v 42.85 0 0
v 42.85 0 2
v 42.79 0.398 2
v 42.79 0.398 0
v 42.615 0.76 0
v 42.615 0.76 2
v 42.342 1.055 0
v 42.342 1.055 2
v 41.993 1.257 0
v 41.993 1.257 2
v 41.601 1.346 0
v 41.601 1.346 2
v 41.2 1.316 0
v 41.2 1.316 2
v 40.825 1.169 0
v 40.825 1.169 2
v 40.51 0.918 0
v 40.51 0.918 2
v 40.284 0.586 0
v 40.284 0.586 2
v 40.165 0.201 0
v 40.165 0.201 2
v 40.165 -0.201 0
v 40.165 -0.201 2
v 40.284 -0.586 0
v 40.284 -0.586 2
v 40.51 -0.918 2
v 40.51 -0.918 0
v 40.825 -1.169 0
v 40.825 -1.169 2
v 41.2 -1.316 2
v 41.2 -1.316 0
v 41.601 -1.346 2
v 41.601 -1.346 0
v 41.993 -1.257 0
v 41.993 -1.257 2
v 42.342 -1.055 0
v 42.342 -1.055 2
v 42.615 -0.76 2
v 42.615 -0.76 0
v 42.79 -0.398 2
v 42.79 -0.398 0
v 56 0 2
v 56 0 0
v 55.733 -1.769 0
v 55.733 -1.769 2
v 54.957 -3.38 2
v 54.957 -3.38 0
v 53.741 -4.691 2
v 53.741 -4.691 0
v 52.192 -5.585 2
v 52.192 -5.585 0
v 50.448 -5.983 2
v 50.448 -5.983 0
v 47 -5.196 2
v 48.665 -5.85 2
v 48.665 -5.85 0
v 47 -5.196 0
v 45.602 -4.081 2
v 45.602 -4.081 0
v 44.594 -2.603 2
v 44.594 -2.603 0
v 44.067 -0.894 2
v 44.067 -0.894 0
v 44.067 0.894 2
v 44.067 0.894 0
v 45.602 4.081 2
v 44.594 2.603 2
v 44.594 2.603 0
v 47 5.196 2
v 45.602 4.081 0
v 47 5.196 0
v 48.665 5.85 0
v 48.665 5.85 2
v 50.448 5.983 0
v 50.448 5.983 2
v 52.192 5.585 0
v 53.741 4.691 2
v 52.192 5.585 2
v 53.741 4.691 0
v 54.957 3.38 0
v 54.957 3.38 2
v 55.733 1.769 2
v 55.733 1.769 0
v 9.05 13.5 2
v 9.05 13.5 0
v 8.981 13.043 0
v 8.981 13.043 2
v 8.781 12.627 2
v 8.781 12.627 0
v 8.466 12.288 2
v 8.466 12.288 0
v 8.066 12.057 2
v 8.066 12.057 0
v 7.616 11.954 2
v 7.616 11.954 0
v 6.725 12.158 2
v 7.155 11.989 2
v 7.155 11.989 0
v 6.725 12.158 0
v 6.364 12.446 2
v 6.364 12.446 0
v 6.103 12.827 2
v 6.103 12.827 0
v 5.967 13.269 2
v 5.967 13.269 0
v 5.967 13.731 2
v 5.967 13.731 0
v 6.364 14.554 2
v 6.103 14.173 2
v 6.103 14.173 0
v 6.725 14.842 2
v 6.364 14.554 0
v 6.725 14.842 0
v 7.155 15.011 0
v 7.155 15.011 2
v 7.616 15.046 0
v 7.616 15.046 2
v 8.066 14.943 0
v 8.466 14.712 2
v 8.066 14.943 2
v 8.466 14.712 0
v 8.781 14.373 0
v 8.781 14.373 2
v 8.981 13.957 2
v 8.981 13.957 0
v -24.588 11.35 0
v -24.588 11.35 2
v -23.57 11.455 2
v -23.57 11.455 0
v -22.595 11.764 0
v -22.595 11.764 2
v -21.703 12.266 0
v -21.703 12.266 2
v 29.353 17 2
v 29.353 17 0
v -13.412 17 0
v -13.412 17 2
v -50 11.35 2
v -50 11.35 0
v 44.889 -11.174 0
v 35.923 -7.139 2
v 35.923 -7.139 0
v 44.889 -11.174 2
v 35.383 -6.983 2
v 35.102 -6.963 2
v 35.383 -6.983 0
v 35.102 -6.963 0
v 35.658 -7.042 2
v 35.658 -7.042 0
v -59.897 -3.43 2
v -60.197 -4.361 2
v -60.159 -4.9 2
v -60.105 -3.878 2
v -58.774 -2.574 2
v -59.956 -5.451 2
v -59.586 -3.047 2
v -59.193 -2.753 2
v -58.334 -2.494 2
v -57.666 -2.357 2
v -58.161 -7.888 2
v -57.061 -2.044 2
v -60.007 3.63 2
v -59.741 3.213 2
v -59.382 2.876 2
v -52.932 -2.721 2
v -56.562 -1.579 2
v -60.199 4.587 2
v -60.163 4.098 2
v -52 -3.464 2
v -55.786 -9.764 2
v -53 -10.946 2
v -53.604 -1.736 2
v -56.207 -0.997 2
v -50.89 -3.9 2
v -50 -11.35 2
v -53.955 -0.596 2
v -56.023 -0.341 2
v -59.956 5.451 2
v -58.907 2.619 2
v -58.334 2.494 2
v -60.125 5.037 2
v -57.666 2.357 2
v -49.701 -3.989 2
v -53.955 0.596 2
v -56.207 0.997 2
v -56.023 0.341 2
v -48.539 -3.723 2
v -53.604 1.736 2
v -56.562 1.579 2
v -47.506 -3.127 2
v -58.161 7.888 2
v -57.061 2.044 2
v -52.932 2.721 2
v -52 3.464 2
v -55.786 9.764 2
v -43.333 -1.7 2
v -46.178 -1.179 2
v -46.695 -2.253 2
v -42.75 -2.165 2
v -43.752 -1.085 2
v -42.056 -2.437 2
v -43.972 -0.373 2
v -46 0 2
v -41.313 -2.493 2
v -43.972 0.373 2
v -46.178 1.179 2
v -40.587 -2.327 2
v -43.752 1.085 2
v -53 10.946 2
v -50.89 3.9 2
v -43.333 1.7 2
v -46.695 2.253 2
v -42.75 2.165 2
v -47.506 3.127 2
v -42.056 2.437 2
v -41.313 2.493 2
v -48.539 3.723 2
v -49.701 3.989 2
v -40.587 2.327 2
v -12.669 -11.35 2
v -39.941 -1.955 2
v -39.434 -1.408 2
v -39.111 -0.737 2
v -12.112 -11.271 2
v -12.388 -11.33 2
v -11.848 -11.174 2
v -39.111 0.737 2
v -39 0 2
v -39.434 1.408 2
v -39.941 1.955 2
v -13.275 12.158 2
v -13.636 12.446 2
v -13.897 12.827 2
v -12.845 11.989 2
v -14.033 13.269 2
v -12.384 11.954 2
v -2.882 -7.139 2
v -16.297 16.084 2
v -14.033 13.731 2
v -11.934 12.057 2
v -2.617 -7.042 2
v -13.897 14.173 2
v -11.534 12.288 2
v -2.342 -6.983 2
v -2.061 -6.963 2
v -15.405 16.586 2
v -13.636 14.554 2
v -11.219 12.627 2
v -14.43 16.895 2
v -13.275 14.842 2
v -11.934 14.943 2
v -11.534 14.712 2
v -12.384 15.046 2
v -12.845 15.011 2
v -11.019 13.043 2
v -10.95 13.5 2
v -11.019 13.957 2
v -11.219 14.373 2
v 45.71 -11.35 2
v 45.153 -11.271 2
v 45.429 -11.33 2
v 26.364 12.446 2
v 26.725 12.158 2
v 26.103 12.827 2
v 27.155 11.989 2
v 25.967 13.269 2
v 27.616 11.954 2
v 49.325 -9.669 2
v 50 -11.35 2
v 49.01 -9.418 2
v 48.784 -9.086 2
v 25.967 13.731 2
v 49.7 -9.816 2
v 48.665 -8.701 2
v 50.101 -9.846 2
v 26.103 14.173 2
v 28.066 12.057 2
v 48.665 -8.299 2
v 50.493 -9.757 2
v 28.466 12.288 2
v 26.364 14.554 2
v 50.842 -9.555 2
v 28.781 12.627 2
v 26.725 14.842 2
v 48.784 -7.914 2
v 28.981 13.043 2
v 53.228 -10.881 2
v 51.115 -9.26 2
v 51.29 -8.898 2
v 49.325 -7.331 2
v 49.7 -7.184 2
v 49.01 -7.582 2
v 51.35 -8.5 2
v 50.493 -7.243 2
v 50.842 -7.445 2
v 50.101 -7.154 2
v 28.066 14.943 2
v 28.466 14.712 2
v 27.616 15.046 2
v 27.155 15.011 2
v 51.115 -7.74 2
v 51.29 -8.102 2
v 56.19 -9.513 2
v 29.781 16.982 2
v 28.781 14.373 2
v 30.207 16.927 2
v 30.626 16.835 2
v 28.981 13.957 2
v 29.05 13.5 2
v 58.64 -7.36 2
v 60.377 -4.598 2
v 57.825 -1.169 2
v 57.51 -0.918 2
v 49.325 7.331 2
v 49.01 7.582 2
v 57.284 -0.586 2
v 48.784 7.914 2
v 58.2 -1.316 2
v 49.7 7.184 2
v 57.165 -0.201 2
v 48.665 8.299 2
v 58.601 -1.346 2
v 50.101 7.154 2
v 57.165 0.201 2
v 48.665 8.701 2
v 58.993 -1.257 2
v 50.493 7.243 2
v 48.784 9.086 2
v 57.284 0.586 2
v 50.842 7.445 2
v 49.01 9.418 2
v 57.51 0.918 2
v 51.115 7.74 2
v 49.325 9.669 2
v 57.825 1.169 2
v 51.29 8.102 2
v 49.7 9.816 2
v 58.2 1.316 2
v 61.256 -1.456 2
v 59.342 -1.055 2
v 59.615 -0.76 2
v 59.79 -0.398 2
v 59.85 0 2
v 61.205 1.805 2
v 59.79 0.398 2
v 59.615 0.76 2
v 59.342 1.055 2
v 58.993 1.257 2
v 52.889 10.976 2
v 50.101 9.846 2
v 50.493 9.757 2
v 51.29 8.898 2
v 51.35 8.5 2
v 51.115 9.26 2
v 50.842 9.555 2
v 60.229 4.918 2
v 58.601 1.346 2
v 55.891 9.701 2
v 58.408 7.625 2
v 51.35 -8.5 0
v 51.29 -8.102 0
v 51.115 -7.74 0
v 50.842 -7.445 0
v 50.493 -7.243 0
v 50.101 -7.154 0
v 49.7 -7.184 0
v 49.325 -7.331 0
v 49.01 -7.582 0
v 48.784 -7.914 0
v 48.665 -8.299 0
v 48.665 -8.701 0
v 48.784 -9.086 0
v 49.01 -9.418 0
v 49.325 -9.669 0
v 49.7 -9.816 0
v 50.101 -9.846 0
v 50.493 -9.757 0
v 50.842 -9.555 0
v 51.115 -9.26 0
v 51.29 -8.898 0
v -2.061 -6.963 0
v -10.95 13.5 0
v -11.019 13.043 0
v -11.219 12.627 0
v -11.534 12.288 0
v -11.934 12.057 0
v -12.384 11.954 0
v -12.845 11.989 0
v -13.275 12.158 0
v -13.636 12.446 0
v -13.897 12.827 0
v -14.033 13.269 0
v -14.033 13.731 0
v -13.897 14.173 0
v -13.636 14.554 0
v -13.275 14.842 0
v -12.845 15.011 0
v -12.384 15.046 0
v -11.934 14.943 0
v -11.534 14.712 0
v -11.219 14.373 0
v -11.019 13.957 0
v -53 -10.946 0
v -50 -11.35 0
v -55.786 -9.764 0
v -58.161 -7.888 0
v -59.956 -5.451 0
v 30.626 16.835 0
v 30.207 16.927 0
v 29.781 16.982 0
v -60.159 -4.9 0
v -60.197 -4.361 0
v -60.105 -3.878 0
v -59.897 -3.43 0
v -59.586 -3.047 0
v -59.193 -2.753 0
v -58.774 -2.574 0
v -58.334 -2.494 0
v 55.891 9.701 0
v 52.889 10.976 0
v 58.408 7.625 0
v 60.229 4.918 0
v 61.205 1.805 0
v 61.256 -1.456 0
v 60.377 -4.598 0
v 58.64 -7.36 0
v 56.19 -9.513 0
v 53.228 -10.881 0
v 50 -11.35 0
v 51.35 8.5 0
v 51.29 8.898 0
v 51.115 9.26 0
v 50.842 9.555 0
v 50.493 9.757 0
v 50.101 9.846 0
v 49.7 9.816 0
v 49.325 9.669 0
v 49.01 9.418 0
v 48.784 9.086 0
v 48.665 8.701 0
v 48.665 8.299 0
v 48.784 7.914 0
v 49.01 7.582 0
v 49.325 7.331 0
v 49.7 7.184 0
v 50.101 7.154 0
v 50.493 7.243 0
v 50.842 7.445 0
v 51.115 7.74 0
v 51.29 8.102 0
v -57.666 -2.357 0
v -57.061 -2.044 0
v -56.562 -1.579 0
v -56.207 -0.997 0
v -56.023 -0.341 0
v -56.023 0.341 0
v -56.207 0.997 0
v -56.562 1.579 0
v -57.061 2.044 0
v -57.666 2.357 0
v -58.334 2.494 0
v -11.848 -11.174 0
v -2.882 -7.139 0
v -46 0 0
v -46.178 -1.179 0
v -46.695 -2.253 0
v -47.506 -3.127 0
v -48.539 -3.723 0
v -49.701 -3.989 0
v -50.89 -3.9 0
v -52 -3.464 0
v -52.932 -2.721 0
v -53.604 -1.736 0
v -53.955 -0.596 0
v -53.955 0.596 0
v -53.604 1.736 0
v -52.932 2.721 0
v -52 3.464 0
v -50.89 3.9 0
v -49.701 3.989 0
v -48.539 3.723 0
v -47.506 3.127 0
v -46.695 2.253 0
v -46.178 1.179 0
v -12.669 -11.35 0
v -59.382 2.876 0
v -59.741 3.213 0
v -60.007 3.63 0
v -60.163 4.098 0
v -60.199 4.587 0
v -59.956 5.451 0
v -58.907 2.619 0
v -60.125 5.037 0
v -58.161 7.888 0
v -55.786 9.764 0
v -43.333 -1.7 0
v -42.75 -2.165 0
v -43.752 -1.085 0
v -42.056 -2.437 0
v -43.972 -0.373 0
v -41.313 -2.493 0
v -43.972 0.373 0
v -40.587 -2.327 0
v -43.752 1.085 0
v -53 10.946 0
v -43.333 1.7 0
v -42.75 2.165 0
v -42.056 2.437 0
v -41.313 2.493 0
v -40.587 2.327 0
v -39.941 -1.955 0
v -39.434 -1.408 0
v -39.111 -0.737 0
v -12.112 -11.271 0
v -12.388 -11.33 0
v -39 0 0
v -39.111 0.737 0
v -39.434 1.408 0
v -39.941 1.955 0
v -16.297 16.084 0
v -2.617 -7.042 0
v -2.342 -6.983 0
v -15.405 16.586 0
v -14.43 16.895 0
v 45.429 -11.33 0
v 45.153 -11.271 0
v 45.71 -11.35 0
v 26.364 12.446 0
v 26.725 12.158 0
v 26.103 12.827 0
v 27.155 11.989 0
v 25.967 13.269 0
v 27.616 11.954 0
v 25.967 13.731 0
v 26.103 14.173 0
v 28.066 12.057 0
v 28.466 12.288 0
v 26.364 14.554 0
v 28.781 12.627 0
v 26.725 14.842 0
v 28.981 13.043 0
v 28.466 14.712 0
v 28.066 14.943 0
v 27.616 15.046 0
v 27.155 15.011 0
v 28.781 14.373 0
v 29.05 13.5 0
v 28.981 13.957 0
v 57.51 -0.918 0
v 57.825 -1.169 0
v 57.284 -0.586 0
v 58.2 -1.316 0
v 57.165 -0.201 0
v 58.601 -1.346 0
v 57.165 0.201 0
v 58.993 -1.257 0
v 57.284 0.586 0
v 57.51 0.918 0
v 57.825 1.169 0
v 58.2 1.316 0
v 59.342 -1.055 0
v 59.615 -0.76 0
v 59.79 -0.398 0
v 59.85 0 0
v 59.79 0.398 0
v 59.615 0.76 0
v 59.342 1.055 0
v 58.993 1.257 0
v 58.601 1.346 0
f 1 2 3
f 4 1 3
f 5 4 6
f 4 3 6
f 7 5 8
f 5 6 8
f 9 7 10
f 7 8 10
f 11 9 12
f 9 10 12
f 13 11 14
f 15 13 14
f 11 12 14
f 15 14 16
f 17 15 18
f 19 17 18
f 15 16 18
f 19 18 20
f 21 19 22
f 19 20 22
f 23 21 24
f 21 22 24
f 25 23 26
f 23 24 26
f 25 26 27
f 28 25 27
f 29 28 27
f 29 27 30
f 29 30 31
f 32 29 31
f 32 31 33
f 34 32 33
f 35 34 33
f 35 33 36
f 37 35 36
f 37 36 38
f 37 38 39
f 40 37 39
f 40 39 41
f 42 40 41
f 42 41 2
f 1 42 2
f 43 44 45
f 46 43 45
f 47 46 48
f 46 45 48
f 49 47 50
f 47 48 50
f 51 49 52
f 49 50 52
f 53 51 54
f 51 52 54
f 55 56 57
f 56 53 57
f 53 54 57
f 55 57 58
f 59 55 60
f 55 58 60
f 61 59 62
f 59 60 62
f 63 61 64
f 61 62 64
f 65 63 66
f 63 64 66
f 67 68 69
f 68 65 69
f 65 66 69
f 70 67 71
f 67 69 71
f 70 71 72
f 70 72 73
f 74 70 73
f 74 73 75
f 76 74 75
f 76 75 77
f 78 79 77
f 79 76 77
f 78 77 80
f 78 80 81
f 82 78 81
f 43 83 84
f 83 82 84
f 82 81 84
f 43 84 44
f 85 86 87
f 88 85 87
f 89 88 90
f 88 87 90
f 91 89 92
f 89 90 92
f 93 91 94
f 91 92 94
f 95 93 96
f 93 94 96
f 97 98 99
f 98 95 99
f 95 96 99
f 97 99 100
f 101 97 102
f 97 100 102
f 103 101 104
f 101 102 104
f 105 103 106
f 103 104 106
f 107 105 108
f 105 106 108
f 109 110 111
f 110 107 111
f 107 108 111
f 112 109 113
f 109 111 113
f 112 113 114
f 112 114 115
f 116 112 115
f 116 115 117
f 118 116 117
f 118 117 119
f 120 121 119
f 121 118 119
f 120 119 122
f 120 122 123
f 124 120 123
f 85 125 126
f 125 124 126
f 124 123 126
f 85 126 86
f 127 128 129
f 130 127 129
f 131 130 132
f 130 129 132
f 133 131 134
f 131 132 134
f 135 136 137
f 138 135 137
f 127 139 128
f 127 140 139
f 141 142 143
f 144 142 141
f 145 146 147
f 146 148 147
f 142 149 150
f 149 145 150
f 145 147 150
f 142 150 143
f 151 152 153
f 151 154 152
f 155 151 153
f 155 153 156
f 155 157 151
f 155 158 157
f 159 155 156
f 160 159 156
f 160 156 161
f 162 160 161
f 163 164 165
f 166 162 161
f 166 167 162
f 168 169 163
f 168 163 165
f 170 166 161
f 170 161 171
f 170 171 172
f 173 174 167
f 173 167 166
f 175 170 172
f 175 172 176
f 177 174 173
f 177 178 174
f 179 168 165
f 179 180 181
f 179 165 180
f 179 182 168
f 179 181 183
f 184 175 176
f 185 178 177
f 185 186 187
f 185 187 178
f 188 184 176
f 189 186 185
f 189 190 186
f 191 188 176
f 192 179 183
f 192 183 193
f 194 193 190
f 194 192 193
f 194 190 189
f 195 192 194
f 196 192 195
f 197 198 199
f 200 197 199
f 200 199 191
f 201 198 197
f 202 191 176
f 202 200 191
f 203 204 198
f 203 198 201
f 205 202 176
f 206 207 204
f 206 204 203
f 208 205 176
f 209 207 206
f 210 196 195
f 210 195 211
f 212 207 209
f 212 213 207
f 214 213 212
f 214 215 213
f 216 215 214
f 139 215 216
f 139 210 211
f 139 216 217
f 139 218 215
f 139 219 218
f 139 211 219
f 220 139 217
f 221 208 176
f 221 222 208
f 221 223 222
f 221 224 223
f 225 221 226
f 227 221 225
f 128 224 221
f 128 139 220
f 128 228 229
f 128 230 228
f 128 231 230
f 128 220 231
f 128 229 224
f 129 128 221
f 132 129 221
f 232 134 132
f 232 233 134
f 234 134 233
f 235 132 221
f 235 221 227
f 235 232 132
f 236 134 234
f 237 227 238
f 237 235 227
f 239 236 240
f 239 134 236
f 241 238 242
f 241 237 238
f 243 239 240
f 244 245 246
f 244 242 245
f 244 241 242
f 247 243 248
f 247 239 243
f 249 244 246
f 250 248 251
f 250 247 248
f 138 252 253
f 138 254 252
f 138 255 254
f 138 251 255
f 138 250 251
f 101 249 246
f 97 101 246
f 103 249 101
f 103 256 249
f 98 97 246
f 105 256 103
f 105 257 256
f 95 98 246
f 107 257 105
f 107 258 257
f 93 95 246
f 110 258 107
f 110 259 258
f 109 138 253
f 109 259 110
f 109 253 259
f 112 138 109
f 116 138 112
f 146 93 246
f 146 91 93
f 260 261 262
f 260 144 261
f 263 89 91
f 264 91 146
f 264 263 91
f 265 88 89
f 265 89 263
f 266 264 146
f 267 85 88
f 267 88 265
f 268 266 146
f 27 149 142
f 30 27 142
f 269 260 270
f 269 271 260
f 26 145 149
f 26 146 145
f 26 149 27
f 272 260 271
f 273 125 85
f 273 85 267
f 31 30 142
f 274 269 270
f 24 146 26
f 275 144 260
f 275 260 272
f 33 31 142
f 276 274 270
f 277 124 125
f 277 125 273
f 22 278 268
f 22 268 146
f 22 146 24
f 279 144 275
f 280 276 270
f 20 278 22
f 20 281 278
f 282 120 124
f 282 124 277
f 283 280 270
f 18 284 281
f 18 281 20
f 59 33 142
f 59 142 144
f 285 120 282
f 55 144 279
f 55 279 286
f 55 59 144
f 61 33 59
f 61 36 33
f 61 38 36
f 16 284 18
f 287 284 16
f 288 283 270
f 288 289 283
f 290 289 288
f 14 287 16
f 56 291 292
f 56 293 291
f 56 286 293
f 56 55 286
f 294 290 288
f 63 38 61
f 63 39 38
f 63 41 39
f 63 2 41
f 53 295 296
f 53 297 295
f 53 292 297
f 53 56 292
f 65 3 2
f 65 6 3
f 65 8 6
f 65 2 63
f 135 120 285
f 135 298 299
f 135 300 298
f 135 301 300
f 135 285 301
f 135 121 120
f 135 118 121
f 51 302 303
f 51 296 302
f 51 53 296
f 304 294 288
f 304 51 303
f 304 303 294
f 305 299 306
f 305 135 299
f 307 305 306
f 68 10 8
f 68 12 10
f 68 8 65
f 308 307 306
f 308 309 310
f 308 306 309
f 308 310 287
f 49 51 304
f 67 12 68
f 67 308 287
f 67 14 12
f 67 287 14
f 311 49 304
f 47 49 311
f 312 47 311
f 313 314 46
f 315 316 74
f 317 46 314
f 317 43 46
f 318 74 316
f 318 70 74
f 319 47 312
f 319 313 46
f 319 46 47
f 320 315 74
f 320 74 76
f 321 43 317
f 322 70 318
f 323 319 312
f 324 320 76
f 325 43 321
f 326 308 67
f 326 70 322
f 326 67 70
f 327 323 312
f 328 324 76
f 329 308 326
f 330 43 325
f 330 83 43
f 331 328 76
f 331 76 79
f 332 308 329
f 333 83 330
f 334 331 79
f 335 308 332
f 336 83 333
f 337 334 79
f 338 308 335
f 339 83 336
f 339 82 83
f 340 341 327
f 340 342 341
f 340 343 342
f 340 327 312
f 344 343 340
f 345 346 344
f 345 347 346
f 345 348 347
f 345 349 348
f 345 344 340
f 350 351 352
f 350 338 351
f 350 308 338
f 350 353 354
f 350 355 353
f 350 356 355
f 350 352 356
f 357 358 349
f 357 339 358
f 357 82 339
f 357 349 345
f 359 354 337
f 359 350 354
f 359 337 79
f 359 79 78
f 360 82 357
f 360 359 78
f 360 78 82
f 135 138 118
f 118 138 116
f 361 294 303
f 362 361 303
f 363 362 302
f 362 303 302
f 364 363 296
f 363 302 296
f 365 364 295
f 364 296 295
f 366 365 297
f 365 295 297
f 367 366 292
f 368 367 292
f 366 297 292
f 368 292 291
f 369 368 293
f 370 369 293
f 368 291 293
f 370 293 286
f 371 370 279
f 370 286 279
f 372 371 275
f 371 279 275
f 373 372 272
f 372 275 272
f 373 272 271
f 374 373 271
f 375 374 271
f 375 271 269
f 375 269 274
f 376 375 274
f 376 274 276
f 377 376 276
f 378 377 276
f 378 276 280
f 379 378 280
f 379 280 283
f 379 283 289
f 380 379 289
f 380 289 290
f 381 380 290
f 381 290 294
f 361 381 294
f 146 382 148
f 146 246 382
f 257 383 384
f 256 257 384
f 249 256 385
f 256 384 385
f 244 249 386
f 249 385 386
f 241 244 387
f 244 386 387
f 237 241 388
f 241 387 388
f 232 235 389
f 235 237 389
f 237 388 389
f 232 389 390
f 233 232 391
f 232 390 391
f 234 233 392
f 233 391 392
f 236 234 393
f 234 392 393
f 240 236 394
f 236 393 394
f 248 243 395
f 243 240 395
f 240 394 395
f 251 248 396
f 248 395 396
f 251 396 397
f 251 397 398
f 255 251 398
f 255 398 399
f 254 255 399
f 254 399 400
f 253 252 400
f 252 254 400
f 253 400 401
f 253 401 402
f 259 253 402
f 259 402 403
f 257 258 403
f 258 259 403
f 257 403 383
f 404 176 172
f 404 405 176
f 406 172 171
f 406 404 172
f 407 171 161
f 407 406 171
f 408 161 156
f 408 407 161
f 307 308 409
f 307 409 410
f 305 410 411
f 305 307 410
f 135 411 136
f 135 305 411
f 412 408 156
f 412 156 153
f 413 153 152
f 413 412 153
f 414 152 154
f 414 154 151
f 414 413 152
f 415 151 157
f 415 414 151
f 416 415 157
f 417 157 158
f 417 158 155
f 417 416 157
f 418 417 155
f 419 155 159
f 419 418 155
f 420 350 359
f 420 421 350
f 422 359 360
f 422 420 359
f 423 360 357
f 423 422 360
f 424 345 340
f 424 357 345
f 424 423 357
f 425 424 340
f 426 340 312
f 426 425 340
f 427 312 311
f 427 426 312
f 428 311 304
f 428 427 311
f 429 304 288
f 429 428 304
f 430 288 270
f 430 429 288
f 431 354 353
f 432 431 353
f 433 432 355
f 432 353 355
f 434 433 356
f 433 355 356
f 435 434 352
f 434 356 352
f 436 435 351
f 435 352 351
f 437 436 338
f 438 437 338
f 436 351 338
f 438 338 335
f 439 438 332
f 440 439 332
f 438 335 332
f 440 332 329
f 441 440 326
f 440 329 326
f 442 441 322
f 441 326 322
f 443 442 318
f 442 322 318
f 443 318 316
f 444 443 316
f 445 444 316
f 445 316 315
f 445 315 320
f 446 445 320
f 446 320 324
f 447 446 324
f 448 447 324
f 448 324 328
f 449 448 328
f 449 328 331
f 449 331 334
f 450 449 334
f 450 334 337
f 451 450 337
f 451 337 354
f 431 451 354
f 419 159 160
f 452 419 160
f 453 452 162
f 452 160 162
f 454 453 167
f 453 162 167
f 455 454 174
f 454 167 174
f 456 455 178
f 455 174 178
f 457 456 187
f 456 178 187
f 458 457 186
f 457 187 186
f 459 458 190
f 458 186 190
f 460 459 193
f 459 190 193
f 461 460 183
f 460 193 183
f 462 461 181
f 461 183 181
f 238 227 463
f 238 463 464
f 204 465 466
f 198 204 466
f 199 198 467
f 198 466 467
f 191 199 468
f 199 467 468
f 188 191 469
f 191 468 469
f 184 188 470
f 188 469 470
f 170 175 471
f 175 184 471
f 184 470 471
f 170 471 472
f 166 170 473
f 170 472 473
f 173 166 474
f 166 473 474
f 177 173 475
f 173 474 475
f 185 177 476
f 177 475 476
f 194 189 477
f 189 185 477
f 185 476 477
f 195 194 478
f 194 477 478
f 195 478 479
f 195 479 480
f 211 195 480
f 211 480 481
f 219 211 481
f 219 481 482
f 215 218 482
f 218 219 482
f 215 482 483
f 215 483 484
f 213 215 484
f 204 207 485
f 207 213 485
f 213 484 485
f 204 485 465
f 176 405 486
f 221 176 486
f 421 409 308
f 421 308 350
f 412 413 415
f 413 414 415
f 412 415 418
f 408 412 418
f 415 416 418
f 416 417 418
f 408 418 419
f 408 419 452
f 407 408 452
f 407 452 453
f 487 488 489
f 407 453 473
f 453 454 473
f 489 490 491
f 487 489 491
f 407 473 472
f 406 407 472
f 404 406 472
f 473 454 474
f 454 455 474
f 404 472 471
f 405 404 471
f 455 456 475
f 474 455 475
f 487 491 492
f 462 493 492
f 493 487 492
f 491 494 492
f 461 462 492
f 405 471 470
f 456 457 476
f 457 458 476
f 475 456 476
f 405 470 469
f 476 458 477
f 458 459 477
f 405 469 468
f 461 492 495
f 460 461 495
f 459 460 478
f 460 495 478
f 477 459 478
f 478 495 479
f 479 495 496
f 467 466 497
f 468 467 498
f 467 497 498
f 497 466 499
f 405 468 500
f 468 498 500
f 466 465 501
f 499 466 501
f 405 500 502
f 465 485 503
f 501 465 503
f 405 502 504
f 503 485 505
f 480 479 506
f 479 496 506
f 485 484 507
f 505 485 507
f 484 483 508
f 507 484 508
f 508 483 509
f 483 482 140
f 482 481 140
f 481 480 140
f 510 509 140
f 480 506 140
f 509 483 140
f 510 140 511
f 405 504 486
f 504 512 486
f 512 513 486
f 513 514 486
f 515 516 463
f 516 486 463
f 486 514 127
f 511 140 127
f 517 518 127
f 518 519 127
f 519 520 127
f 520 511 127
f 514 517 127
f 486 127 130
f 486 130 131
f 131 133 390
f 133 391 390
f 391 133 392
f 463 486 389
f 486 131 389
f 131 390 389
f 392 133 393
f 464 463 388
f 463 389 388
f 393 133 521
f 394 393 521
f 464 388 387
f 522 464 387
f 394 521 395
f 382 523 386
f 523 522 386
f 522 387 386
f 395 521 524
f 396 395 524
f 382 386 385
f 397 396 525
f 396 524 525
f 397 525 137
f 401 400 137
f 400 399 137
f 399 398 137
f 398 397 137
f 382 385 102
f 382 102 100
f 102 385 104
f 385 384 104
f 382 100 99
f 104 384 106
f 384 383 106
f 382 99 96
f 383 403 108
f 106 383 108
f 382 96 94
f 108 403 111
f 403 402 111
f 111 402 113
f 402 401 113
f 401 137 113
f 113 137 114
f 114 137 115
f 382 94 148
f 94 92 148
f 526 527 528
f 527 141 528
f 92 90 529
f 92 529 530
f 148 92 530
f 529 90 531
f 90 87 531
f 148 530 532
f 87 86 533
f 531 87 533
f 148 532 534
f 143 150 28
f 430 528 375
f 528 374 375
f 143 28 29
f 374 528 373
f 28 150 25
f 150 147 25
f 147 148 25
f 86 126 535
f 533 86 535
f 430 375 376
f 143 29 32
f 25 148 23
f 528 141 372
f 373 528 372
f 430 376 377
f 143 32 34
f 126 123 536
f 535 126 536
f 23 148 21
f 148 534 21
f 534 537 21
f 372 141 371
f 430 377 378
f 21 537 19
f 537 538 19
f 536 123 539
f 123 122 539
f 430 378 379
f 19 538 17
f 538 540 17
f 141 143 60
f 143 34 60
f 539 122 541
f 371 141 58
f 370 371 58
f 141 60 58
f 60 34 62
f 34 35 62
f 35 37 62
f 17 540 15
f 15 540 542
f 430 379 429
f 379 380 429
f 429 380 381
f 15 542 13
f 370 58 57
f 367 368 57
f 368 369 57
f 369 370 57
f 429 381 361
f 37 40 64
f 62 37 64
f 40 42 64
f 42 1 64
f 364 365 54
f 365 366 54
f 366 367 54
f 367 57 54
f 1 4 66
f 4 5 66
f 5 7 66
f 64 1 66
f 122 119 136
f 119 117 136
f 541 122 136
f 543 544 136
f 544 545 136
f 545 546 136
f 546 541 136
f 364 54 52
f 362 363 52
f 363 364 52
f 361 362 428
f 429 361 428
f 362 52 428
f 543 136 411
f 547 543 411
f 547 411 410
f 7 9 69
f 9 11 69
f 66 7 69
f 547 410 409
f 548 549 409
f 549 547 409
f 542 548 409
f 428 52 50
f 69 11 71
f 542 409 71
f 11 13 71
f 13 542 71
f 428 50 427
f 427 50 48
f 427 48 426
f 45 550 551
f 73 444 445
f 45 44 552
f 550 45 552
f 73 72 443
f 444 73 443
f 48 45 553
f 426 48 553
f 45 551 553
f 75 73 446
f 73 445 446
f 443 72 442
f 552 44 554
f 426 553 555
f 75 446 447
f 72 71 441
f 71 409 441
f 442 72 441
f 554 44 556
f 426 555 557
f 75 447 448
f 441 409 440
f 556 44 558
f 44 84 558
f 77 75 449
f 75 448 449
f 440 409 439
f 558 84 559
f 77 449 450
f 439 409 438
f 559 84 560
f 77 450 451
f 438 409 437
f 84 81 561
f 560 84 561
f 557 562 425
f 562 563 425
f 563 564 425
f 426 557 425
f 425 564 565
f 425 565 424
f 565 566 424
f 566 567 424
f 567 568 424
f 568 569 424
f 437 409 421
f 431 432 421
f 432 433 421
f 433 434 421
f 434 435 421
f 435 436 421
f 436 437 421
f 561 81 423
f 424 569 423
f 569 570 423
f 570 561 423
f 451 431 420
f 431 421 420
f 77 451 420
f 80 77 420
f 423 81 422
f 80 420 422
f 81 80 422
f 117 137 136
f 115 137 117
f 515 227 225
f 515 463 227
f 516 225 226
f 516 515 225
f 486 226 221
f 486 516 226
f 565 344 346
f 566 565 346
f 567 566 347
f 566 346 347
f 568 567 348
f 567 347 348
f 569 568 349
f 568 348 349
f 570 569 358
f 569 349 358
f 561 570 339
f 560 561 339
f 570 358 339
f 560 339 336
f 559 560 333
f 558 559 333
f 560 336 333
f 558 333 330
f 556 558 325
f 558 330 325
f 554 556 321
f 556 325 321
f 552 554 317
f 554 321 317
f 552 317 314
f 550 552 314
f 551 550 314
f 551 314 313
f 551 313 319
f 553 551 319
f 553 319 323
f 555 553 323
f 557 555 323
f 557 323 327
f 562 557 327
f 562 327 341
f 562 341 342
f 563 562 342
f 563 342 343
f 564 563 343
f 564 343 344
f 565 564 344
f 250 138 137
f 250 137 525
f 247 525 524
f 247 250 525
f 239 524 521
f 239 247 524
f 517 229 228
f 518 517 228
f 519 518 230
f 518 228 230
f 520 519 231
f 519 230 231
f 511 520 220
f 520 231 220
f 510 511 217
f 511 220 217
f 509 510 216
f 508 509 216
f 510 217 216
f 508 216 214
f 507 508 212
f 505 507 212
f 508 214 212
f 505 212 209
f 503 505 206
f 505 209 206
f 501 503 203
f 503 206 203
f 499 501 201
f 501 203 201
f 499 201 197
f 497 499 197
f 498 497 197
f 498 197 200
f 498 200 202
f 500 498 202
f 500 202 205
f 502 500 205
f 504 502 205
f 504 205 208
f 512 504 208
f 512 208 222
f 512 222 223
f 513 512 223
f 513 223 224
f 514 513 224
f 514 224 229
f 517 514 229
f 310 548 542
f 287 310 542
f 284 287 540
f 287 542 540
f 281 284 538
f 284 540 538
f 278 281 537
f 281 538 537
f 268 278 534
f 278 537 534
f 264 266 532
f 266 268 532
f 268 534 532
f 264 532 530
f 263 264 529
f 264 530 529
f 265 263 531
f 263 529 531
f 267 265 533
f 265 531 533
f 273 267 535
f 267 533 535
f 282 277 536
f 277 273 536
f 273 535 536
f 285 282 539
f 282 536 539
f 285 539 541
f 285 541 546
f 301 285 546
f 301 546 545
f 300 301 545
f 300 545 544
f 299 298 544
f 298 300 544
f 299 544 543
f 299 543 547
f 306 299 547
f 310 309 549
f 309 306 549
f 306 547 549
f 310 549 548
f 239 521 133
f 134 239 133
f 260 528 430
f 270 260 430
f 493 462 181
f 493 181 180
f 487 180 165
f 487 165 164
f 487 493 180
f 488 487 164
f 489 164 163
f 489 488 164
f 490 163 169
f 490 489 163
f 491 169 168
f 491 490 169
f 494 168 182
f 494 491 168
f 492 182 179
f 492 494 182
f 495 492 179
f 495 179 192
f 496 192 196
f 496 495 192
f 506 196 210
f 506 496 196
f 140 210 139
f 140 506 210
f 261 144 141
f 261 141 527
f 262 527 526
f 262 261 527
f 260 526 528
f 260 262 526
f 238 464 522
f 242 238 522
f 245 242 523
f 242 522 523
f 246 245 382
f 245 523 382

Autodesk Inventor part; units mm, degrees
ref_plane "YZ Plane" through (0, 0, 0) normal (1, 0, 0) x (0, 1, 0)
ref_plane "XZ Plane" through (0, 0, 0) normal (0, 1, 0) x (-1, 0, 0)
ref_plane "XY Plane" through (0, 0, 0) normal (0, 0, 1) x (1, 0, 0)
sketch "スケッチ1" plane through (0, 0, 0) normal (0, 0, 1) x (1, 0, 0)
  line L0 (-50, 0) -> (50, 0) construction
  circle A0 centre (-50, 0) radius 4
  circle A1 centre (50, 0) radius 6
  line L1 (-50, 11.35) -> (-23, 11.35)
  line L2 (-50, -11.35) -> (50, -11.35)
  arc A2 (50, -11.35) -> (50, 11.35) centre (50, 0) ccw
  line L3 (30, 17) -> (-15, 17)
  line L4 (-15, 17) -> (-23, 11.35)
  line L5 (-24.9115, 10) -> (41.8474, 10) construction
  line L6 (-15, 17) -> (-15, 10) construction
  line L7 (30, 17) -> (30, 10) construction
  circle A3 centre (27.5, 13.5) radius 1.55
  circle A4 centre (-12.5, 13.5) radius 1.55
  circle A5 centre (7.5, 13.5) radius 1.55
  line L8 (-15, 13.5) -> (30, 13.5) construction
  line L9 (30, 16) -> (-15, 16) construction
  line L10 (-15, 16) -> (-15, 11) construction
  line L11 (-15, 11) -> (30, 11) construction
  line L12 (30, 11) -> (30, 16) construction
  line L13 (-23, 11.35) -> (50, 11.35)
  arc A6 (-50, 11.35) -> (-50, -11.35) centre (-50, 0) ccw
  line L14 (7.5, 17) -> (7.5, 10.5172) construction
  line L15 (30, 17) -> (52.8887, 10.9762)
  point P0 (0, 0)
  point P1 (0, 0)
  point P2 (55.7736, 9.7718)
  point P3 (38, 11.35)
  dimension "d0" = 100
  dimension "d1" = 8
  dimension "d8" = 12
  dimension "d10" = 7
  dimension "d11" = 45
  dimension "d12" = 2.5
  dimension "d13" = 3.1
  dimension "d14" = 2.5
  dimension "d15" = 20
  dimension "d17" = 5
  dimension "d18" = 11
  dimension "d69" = 11.35
  dimension "d72" = 11.35
  dimension "d87" = 8
  dimension "d88" = 8
extrude "押し出し1" add sketch "スケッチ1" along normal blind 2
fillet "フィレット1" radius 5 4 edges at (-23, 11.35, 1) (-15, 17, 1) (30, 17, 1) (-50, 11.35, 1)
sketch "スケッチ2" plane through (0, 0, 2) normal (0, 0, 1) x (1, 0, 0)
  arc A0 (50, -11.35) -> (52.8887, 10.9762) centre (50, 0) ccw projected
  line L0 (18, -20) -> (-35.4549, -20) construction
  line L1 (-76.9372, -11.5) -> (-72, -11.5)
  line L2 (-76.9372, -12.4) -> (-76.9372, -11.5)
  line L3 (-71.9872, -11.45) -> (-76.9872, -11.45)
  line L4 (-76.9872, -11.45) -> (-76.9872, -12.45)
  circle A1 centre (-50, 0) radius 4 projected
  circle A2 centre (-50, 0) radius 5.5 construction
  circle A3 centre (50, 0) radius 6 projected
  line L5 (83.3205, -17.7128) -> (50, 0) construction
  line L6 (50, 0) -> (18, -20) construction
  line L7 (83.3205, -17.7128) -> (37.8533, -17.7128) construction
  line L8 (-13.4166, -12.4128) -> (46.4577, -12.4128)
  line L9 (46.4577, -12.4128) -> (46.4577, -11.5128)
  line L10 (46.4577, -11.5128) -> (45.5205, -11.5128)
  line L11 (45.5205, -11.5128) -> (35.5205, -7.0128)
  line L12 (35.5205, -7.0128) -> (-2.4795, -7.0128)
  line L13 (-2.4795, -7.0128) -> (-12.4795, -11.5128)
  line L14 (-12.4795, -11.5128) -> (-13.4166, -11.5128)
  line L15 (-13.4166, -11.5128) -> (-13.4166, -12.4128)
  line L16 (-12.4902, -11.4628) -> (-2.4902, -6.9628)
  line L17 (-2.4902, -6.9628) -> (35.5312, -6.9628)
  line L18 (35.5312, -6.9628) -> (45.5312, -11.4628)
  line L19 (45.5312, -11.4628) -> (46.5077, -11.4628)
  line L20 (46.5077, -11.4628) -> (46.5077, -12.4628)
  line L21 (46.5077, -12.4628) -> (-13.4666, -12.4628)
  line L22 (-13.4666, -12.4628) -> (-13.4666, -11.4628)
  line L23 (-13.4666, -11.4628) -> (-12.4902, -11.4628)
  point P0 (56.6914, 9.1677)
  point P1 (0, 0)
  point P2 (50, 11.35)
  dimension "d19" = 20
  dimension "d20" = 32
  dimension "d32" = 11
  dimension "d33" = 120
  dimension "d37" = 37.8
  dimension "d38" = 6.2
  dimension "d39" = 0.05
  dimension "d49" = 38
  dimension "d50" = 10
  dimension "d51" = 10
  dimension "d52" = 4.5
  dimension "d53" = 0.9
  dimension "d54" = 59.9743
extrude "押し出し2" cut sketch "スケッチ2" against normal blind 10 contours L15 L14 L13 L12 L11 L10 L9 L8 | L16 L17 L18 L19 L20 L21 L22 L23
fillet "フィレット2" radius 2 4 edges at (45.2805, -11.35, 1) (-12.2395, -11.35, 1) (35.5312, -6.9628, 1) (-2.4902, -6.9628, 1)
sketch "スケッチ4" plane through (0, 0, 2) normal (0, 0, 1) x (1, 0, 0)
  circle A0 centre (50, 0) radius 6 projected
  circle A1 centre (50, 0) radius 8.5 construction
  line L0 (50, 0) -> (50, 8.5) construction
  circle A2 centre (50, 8.5) radius 1.35
  circle A3 centre (41.5, 0) radius 1.35
  circle A4 centre (50, -8.5) radius 1.35
  circle A5 centre (58.5, 0) radius 1.35
  point P0 (0, 0)
  dimension "d61" = 17
  dimension "d62" = 2.7
  dimension "d65" = 360
extrude "押し出し4" cut sketch "スケッチ4" against normal through all contours A2 | A3 | A4 | A5
sketch "スケッチ6" plane through (0, 0, 2) normal (0, 0, 1) x (1, 0, 0)
  circle A0 centre (-50, 0) radius 4 projected
  circle A1 centre (-50, 0) radius 8.5 construction
  circle A2 centre (-58.5, 0) radius 2.5
  line L0 (-50, 0) -> (-58.5, 0) construction
  line L1 (-50, 0) -> (-41.5, 0) construction
  circle A3 centre (-41.5, 0) radius 2.5
  arc A4 (-50, 11.35) -> (-50, -11.35) centre (-50, 0) ccw projected
  line L2 (-58.5, -2.5) -> (-61.0712, -2.5)
  line L3 (-58.5, 2.5) -> (-61.0712, 2.5)
  point P0 (0, 0)
  dimension "d78" = 17
  dimension "d79" = 5
  dimension "d82" = 360
extrude "押し出し6" cut sketch "スケッチ6" against normal through all contours A2 | A2 L2 A4 L3 | A3
fillet "フィレット4" radius 2 2 edges at (-61.0712, 2.5, 1) (-61.0712, -2.5, 1)
equation "\"d14\" = d12"
properties part number "リンク_メインフレーム_6_4" material "GFRP"
